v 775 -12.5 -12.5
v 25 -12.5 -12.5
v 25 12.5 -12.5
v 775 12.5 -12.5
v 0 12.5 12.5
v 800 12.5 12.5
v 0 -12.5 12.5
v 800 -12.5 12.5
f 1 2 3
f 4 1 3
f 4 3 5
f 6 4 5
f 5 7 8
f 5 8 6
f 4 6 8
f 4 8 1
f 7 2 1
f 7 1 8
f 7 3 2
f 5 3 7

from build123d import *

# Parameters (mm, degrees)
F0_W          = 25
F0_H          = 25
F1_DEPTH      = 800
F3_DEPTH      = 12.501
F3_DEPTH_BACK = 12.501
F5_DEPTH      = 12.501
F5_DEPTH_BACK = 12.501


with BuildPart() as f1:
    # F0 (on Right) → F1 (new body)
    with BuildSketch(Plane.YZ):
        Rectangle(F0_W, F0_H)
    extrude(amount=F1_DEPTH)

    # F2 (on Front) → F3 (cut, two sides)
    with BuildSketch(Plane.XZ) as f3_sk:
        Polygon((25, -12.5), (0, 12.5), (0, -12.5), align=None)
    extrude(amount=-F3_DEPTH, mode=Mode.SUBTRACT)
    extrude(f3_sk.sketch, amount=F3_DEPTH_BACK, mode=Mode.SUBTRACT)

    # F4 (on Front) → F5 (cut, two sides)
    with BuildSketch(Plane.XZ) as f5_sk:
        Polygon((800, -12.5), (800, 12.5), (775, -12.5), align=None)
    extrude(amount=-F5_DEPTH, mode=Mode.SUBTRACT)
    extrude(f5_sk.sketch, amount=F5_DEPTH_BACK, mode=Mode.SUBTRACT)


solid = f1.part
